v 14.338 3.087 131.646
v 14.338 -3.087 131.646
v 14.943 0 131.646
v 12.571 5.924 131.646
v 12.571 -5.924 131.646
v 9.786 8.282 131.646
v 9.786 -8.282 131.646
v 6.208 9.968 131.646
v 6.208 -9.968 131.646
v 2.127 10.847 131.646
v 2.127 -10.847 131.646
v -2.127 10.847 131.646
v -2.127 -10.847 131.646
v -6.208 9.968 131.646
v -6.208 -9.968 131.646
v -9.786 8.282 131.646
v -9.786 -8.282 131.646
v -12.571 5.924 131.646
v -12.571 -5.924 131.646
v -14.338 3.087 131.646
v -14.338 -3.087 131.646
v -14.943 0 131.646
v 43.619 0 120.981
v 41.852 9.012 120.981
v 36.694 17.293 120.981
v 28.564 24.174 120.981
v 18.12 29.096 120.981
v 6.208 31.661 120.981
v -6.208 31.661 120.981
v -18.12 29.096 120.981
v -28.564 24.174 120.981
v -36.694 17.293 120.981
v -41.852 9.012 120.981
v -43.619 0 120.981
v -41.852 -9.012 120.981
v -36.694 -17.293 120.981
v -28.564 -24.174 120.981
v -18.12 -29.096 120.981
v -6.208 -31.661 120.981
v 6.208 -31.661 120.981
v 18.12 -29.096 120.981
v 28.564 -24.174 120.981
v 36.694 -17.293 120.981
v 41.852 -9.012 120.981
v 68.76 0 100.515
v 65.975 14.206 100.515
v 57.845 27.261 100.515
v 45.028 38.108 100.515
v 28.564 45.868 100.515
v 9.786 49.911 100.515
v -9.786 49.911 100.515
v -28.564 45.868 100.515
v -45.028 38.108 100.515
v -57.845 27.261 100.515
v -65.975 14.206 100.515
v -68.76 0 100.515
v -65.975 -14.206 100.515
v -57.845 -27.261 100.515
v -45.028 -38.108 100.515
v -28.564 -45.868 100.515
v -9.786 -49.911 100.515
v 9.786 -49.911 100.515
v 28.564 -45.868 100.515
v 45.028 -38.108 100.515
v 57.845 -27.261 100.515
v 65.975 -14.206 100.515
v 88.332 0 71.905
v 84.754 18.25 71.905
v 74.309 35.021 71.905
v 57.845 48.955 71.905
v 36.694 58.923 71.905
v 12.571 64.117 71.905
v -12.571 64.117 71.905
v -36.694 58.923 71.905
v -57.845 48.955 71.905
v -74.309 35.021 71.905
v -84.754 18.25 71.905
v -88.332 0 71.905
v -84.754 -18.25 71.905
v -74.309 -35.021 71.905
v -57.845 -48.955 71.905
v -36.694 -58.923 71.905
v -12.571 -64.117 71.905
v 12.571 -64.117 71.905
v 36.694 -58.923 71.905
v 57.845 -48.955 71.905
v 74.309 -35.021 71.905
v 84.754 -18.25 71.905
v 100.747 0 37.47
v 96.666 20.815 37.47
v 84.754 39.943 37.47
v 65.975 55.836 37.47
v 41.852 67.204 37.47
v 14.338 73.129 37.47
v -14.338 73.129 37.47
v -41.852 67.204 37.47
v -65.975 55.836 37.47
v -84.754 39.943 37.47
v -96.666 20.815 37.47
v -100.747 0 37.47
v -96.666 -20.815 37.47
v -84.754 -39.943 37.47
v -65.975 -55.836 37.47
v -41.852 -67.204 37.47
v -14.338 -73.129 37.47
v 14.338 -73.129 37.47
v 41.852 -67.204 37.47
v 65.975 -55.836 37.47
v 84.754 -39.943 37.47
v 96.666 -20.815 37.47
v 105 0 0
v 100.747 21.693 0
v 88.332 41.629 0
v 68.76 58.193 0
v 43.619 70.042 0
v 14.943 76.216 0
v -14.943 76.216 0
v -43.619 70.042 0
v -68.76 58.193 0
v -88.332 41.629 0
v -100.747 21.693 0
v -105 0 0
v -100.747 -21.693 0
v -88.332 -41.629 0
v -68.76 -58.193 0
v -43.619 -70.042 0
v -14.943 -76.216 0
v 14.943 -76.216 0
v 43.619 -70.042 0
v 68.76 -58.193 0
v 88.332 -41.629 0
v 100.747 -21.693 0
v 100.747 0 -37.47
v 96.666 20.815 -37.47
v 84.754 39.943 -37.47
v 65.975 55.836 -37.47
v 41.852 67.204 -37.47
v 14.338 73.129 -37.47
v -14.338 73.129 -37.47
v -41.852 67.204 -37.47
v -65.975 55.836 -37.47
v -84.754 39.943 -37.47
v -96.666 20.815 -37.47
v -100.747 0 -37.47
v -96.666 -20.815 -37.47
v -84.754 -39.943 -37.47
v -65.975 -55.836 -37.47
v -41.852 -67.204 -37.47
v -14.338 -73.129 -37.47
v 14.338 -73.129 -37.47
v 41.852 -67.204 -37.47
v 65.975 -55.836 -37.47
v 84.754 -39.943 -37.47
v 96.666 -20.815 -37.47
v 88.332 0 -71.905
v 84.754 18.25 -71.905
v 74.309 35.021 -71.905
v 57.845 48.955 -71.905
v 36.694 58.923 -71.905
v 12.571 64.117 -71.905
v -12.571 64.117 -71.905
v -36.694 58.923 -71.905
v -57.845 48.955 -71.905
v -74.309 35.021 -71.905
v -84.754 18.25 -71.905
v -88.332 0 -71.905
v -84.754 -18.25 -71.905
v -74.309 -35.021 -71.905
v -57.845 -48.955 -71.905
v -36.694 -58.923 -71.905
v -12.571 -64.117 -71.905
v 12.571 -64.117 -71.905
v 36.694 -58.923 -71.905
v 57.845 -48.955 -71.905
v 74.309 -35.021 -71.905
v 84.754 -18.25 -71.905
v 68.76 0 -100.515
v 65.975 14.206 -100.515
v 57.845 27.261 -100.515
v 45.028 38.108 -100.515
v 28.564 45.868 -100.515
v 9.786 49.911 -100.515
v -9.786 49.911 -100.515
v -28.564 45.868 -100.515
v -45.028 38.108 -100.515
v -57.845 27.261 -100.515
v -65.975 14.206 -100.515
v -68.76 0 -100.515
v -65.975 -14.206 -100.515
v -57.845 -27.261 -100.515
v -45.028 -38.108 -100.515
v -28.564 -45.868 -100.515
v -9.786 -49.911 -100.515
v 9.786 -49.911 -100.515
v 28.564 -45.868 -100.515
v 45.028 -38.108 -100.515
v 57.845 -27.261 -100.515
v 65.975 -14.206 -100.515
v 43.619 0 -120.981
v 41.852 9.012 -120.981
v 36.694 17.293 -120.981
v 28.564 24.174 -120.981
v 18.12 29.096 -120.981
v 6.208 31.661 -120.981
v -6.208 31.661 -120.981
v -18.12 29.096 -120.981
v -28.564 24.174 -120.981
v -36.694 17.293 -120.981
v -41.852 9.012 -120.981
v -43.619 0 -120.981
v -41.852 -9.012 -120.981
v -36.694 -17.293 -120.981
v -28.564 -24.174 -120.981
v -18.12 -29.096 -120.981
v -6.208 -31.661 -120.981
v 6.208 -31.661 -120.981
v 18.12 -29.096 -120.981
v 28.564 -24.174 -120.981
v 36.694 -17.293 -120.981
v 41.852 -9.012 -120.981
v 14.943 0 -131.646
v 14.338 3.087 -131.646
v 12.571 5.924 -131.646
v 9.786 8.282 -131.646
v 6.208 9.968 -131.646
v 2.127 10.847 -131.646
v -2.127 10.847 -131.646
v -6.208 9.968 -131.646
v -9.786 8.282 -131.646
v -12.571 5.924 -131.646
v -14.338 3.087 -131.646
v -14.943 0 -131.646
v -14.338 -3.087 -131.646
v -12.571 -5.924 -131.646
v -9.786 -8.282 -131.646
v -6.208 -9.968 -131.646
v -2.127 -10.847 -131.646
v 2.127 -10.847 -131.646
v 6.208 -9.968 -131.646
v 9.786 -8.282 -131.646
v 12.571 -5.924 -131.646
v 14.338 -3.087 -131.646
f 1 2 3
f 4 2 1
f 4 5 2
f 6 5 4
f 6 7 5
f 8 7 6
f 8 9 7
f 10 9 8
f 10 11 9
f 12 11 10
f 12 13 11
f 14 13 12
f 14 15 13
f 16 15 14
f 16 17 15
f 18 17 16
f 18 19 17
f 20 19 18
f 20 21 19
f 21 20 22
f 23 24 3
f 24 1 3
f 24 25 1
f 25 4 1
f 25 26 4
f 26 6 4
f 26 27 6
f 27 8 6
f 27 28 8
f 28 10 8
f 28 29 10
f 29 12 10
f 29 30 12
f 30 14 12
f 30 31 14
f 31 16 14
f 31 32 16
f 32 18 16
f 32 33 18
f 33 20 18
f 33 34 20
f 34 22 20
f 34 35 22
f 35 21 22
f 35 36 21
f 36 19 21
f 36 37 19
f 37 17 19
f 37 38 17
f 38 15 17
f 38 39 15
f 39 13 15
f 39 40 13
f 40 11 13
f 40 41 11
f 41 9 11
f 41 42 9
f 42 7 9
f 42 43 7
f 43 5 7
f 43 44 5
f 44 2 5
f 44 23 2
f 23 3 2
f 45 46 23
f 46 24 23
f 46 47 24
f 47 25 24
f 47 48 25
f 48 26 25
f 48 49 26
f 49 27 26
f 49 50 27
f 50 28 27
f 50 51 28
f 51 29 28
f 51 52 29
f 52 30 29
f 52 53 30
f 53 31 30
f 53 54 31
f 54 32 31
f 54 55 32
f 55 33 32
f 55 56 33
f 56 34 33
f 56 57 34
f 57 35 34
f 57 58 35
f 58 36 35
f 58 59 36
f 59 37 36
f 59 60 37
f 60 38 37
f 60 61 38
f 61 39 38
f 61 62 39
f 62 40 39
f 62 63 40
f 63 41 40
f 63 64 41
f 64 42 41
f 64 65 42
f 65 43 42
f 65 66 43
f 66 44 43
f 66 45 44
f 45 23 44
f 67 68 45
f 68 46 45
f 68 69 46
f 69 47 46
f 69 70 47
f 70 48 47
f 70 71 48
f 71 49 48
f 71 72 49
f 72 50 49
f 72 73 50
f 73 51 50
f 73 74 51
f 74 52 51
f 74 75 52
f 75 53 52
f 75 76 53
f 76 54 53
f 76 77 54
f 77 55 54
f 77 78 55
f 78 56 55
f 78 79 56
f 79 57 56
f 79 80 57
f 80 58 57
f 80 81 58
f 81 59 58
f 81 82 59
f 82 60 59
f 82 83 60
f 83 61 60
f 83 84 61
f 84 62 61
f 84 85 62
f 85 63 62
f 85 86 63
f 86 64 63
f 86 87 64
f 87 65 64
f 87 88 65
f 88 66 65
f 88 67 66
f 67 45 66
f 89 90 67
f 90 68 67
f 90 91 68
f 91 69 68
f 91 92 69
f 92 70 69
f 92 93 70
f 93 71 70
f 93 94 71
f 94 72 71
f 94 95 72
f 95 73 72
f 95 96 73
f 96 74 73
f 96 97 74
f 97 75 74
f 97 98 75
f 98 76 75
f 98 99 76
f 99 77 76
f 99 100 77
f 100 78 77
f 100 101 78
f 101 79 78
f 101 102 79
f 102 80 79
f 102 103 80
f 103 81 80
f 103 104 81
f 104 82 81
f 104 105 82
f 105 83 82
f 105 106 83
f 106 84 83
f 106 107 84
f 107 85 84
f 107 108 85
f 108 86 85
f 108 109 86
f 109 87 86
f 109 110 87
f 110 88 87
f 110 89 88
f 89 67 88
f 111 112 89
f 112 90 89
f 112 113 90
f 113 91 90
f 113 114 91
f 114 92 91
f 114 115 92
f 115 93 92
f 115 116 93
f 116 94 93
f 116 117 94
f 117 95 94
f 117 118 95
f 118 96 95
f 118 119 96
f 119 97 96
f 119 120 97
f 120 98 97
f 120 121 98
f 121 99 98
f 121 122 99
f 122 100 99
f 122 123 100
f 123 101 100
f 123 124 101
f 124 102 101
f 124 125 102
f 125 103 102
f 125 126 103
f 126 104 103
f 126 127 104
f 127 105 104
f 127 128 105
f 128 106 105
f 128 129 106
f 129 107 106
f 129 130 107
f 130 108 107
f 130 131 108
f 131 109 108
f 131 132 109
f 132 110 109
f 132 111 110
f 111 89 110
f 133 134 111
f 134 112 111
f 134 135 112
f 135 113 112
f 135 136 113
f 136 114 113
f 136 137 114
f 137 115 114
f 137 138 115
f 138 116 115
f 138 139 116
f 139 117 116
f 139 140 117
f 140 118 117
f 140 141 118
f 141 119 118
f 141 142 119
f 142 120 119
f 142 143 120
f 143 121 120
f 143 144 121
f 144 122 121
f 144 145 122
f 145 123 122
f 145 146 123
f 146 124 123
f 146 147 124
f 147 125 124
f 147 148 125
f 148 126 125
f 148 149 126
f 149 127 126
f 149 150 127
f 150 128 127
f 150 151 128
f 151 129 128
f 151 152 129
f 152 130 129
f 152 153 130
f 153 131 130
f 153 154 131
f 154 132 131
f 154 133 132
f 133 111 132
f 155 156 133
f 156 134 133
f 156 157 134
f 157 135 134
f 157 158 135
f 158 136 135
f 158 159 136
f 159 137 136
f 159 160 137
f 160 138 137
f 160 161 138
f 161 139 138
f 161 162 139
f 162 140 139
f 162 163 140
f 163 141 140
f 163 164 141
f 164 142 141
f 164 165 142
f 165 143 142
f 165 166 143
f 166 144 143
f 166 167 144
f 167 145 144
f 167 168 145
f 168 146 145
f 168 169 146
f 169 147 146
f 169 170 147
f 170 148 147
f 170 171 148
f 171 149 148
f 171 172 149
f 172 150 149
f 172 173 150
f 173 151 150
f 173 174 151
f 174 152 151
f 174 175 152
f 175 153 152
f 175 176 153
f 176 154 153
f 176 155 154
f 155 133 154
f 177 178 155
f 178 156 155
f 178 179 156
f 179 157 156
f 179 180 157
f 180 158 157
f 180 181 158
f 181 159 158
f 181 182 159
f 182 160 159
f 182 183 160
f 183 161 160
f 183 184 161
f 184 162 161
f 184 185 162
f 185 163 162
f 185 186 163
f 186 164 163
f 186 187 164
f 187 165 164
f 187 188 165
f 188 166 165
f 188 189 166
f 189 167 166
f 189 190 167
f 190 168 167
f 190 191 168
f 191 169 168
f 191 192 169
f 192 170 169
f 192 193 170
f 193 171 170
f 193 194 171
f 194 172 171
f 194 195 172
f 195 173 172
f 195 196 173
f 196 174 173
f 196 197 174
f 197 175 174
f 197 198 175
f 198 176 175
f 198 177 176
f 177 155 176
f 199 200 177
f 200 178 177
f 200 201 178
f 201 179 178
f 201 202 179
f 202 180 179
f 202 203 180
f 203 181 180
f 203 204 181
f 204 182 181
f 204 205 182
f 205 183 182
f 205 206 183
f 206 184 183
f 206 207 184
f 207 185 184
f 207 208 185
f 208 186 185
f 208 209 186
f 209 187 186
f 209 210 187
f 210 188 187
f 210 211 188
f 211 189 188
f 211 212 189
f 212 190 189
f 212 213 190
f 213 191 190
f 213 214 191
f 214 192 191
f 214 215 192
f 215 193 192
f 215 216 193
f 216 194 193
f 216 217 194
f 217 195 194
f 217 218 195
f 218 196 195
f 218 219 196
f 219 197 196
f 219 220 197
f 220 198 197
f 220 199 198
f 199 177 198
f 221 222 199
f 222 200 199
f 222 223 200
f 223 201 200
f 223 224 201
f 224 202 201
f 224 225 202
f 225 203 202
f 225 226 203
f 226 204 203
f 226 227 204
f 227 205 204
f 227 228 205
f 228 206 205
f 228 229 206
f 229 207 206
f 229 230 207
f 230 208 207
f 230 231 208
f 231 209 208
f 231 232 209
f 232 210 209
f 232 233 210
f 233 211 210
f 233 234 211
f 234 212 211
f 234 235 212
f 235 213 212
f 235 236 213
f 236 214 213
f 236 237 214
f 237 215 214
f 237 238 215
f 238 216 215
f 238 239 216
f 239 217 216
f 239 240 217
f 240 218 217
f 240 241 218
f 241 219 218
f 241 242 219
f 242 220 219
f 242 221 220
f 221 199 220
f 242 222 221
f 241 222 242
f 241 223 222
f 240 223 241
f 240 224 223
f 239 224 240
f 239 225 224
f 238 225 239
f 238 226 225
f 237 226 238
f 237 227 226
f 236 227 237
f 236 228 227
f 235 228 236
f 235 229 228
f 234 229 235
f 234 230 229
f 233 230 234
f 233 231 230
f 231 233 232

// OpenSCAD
// Generated by SolidPython 1.0.1 on 2020-07-29 00:46:52


scale(v = [15, 11, 19]) {
	sphere(r = 7);
}
/***********************************************
*********      SolidPython code:      **********
************************************************
 
# import packages: SolidPython
from solid import *
from solid.utils import *
from itertools import chain, combinations, permutations


class Resize:

    def __init__(self, scad_file):
        self.scad_file = scad_file
        #self.scad_file = import_scad(scad_file)
        # cone/cylinder param:
        self.r1 = 0
        self.r2 = 0
        self.h = 0
        # rectangular prism param:
        self.w = 0
        self.l = 0
        # ellipse param:
        self.r = 0

    # import OpenScad code (file name corresponds to shape)


    # classify shape + parameters
    def assign(self, param1, param2, param3):
        if self.scad_file == 'cone.scad':
            self.r1 = param1
            self.r2 = param2
            self.h = param3
        elif self.scad_file == 'cylinder.scad':
            self.r1 = param1
            self.r2 = param2
            self.h = param3
        elif self.scad_file == 'rectangularPrism.scad':
            self.h = param1
            self.l = param2
            self.w = param3
        else:
            self.r = param1
            self.h = param2

    # resize parameters
    def iterate(self):
        x = range(3, 20, 2)
        i = 1
        if self.scad_file == 'cone.scad':
            tempList = list(permutations(x, 2))
            for temp in tempList:
                param1 = temp[0]
                param2 = temp[1]
                filepath = 'produced_scad_files/' + 'cone' + str(param1) + '_' + str(param2) + '_' + '.scad'
                scad_render_to_file(cylinder(h=param1, r1=param2, r2=0), filepath)

        elif self.scad_file == 'cylinder.scad':
            tempList = list(permutations(x, 3))
            for temp in tempList:
                param1 = temp[0]
                param2 = temp[1]
                filepath = 'produced_scad_files/' + 'cylinder' + str(param1) + '_' + str(param2) + '_' + '.scad'
                scad_render_to_file(cylinder(h=param1, r1=param2, r2=param2), filepath)

        elif self.scad_file == 'rectangularPrism.scad':
            tempList = list(permutations(x, 3))
            for temp in tempList:
                param1 = temp[0]
                param2 = temp[1]
                param3 = temp[2]
                filepath = 'produced_scad_files/' + 'rectangularPrism' + str(param1) + '_' + str(param2) + '_' + str(
                    param3) + '.scad'
                scad_render_to_file(cube(size=(param1, param2, param3)), filepath)

        elif self.scad_file == 'ellipse.scad':
            tempList = list(permutations(x, 4))
            for temp in tempList:
                param1 = temp[0]
                param2 = temp[1]
                param3 = temp[2]
                param4 = temp[3]
                filepath = 'produced_scad_files/' + 'ellipse' + str(param1) + '_' + str(param2) + '_' + str(param3) + '_' + str(param4) + '.scad'
                scad_render_to_file(scale([param1, param2, param3])(sphere(r=param4)), filepath)

    def render_to_scadfile(self):
        scad_render_to_file(scad, 'example.scad') 
 
************************************************/
